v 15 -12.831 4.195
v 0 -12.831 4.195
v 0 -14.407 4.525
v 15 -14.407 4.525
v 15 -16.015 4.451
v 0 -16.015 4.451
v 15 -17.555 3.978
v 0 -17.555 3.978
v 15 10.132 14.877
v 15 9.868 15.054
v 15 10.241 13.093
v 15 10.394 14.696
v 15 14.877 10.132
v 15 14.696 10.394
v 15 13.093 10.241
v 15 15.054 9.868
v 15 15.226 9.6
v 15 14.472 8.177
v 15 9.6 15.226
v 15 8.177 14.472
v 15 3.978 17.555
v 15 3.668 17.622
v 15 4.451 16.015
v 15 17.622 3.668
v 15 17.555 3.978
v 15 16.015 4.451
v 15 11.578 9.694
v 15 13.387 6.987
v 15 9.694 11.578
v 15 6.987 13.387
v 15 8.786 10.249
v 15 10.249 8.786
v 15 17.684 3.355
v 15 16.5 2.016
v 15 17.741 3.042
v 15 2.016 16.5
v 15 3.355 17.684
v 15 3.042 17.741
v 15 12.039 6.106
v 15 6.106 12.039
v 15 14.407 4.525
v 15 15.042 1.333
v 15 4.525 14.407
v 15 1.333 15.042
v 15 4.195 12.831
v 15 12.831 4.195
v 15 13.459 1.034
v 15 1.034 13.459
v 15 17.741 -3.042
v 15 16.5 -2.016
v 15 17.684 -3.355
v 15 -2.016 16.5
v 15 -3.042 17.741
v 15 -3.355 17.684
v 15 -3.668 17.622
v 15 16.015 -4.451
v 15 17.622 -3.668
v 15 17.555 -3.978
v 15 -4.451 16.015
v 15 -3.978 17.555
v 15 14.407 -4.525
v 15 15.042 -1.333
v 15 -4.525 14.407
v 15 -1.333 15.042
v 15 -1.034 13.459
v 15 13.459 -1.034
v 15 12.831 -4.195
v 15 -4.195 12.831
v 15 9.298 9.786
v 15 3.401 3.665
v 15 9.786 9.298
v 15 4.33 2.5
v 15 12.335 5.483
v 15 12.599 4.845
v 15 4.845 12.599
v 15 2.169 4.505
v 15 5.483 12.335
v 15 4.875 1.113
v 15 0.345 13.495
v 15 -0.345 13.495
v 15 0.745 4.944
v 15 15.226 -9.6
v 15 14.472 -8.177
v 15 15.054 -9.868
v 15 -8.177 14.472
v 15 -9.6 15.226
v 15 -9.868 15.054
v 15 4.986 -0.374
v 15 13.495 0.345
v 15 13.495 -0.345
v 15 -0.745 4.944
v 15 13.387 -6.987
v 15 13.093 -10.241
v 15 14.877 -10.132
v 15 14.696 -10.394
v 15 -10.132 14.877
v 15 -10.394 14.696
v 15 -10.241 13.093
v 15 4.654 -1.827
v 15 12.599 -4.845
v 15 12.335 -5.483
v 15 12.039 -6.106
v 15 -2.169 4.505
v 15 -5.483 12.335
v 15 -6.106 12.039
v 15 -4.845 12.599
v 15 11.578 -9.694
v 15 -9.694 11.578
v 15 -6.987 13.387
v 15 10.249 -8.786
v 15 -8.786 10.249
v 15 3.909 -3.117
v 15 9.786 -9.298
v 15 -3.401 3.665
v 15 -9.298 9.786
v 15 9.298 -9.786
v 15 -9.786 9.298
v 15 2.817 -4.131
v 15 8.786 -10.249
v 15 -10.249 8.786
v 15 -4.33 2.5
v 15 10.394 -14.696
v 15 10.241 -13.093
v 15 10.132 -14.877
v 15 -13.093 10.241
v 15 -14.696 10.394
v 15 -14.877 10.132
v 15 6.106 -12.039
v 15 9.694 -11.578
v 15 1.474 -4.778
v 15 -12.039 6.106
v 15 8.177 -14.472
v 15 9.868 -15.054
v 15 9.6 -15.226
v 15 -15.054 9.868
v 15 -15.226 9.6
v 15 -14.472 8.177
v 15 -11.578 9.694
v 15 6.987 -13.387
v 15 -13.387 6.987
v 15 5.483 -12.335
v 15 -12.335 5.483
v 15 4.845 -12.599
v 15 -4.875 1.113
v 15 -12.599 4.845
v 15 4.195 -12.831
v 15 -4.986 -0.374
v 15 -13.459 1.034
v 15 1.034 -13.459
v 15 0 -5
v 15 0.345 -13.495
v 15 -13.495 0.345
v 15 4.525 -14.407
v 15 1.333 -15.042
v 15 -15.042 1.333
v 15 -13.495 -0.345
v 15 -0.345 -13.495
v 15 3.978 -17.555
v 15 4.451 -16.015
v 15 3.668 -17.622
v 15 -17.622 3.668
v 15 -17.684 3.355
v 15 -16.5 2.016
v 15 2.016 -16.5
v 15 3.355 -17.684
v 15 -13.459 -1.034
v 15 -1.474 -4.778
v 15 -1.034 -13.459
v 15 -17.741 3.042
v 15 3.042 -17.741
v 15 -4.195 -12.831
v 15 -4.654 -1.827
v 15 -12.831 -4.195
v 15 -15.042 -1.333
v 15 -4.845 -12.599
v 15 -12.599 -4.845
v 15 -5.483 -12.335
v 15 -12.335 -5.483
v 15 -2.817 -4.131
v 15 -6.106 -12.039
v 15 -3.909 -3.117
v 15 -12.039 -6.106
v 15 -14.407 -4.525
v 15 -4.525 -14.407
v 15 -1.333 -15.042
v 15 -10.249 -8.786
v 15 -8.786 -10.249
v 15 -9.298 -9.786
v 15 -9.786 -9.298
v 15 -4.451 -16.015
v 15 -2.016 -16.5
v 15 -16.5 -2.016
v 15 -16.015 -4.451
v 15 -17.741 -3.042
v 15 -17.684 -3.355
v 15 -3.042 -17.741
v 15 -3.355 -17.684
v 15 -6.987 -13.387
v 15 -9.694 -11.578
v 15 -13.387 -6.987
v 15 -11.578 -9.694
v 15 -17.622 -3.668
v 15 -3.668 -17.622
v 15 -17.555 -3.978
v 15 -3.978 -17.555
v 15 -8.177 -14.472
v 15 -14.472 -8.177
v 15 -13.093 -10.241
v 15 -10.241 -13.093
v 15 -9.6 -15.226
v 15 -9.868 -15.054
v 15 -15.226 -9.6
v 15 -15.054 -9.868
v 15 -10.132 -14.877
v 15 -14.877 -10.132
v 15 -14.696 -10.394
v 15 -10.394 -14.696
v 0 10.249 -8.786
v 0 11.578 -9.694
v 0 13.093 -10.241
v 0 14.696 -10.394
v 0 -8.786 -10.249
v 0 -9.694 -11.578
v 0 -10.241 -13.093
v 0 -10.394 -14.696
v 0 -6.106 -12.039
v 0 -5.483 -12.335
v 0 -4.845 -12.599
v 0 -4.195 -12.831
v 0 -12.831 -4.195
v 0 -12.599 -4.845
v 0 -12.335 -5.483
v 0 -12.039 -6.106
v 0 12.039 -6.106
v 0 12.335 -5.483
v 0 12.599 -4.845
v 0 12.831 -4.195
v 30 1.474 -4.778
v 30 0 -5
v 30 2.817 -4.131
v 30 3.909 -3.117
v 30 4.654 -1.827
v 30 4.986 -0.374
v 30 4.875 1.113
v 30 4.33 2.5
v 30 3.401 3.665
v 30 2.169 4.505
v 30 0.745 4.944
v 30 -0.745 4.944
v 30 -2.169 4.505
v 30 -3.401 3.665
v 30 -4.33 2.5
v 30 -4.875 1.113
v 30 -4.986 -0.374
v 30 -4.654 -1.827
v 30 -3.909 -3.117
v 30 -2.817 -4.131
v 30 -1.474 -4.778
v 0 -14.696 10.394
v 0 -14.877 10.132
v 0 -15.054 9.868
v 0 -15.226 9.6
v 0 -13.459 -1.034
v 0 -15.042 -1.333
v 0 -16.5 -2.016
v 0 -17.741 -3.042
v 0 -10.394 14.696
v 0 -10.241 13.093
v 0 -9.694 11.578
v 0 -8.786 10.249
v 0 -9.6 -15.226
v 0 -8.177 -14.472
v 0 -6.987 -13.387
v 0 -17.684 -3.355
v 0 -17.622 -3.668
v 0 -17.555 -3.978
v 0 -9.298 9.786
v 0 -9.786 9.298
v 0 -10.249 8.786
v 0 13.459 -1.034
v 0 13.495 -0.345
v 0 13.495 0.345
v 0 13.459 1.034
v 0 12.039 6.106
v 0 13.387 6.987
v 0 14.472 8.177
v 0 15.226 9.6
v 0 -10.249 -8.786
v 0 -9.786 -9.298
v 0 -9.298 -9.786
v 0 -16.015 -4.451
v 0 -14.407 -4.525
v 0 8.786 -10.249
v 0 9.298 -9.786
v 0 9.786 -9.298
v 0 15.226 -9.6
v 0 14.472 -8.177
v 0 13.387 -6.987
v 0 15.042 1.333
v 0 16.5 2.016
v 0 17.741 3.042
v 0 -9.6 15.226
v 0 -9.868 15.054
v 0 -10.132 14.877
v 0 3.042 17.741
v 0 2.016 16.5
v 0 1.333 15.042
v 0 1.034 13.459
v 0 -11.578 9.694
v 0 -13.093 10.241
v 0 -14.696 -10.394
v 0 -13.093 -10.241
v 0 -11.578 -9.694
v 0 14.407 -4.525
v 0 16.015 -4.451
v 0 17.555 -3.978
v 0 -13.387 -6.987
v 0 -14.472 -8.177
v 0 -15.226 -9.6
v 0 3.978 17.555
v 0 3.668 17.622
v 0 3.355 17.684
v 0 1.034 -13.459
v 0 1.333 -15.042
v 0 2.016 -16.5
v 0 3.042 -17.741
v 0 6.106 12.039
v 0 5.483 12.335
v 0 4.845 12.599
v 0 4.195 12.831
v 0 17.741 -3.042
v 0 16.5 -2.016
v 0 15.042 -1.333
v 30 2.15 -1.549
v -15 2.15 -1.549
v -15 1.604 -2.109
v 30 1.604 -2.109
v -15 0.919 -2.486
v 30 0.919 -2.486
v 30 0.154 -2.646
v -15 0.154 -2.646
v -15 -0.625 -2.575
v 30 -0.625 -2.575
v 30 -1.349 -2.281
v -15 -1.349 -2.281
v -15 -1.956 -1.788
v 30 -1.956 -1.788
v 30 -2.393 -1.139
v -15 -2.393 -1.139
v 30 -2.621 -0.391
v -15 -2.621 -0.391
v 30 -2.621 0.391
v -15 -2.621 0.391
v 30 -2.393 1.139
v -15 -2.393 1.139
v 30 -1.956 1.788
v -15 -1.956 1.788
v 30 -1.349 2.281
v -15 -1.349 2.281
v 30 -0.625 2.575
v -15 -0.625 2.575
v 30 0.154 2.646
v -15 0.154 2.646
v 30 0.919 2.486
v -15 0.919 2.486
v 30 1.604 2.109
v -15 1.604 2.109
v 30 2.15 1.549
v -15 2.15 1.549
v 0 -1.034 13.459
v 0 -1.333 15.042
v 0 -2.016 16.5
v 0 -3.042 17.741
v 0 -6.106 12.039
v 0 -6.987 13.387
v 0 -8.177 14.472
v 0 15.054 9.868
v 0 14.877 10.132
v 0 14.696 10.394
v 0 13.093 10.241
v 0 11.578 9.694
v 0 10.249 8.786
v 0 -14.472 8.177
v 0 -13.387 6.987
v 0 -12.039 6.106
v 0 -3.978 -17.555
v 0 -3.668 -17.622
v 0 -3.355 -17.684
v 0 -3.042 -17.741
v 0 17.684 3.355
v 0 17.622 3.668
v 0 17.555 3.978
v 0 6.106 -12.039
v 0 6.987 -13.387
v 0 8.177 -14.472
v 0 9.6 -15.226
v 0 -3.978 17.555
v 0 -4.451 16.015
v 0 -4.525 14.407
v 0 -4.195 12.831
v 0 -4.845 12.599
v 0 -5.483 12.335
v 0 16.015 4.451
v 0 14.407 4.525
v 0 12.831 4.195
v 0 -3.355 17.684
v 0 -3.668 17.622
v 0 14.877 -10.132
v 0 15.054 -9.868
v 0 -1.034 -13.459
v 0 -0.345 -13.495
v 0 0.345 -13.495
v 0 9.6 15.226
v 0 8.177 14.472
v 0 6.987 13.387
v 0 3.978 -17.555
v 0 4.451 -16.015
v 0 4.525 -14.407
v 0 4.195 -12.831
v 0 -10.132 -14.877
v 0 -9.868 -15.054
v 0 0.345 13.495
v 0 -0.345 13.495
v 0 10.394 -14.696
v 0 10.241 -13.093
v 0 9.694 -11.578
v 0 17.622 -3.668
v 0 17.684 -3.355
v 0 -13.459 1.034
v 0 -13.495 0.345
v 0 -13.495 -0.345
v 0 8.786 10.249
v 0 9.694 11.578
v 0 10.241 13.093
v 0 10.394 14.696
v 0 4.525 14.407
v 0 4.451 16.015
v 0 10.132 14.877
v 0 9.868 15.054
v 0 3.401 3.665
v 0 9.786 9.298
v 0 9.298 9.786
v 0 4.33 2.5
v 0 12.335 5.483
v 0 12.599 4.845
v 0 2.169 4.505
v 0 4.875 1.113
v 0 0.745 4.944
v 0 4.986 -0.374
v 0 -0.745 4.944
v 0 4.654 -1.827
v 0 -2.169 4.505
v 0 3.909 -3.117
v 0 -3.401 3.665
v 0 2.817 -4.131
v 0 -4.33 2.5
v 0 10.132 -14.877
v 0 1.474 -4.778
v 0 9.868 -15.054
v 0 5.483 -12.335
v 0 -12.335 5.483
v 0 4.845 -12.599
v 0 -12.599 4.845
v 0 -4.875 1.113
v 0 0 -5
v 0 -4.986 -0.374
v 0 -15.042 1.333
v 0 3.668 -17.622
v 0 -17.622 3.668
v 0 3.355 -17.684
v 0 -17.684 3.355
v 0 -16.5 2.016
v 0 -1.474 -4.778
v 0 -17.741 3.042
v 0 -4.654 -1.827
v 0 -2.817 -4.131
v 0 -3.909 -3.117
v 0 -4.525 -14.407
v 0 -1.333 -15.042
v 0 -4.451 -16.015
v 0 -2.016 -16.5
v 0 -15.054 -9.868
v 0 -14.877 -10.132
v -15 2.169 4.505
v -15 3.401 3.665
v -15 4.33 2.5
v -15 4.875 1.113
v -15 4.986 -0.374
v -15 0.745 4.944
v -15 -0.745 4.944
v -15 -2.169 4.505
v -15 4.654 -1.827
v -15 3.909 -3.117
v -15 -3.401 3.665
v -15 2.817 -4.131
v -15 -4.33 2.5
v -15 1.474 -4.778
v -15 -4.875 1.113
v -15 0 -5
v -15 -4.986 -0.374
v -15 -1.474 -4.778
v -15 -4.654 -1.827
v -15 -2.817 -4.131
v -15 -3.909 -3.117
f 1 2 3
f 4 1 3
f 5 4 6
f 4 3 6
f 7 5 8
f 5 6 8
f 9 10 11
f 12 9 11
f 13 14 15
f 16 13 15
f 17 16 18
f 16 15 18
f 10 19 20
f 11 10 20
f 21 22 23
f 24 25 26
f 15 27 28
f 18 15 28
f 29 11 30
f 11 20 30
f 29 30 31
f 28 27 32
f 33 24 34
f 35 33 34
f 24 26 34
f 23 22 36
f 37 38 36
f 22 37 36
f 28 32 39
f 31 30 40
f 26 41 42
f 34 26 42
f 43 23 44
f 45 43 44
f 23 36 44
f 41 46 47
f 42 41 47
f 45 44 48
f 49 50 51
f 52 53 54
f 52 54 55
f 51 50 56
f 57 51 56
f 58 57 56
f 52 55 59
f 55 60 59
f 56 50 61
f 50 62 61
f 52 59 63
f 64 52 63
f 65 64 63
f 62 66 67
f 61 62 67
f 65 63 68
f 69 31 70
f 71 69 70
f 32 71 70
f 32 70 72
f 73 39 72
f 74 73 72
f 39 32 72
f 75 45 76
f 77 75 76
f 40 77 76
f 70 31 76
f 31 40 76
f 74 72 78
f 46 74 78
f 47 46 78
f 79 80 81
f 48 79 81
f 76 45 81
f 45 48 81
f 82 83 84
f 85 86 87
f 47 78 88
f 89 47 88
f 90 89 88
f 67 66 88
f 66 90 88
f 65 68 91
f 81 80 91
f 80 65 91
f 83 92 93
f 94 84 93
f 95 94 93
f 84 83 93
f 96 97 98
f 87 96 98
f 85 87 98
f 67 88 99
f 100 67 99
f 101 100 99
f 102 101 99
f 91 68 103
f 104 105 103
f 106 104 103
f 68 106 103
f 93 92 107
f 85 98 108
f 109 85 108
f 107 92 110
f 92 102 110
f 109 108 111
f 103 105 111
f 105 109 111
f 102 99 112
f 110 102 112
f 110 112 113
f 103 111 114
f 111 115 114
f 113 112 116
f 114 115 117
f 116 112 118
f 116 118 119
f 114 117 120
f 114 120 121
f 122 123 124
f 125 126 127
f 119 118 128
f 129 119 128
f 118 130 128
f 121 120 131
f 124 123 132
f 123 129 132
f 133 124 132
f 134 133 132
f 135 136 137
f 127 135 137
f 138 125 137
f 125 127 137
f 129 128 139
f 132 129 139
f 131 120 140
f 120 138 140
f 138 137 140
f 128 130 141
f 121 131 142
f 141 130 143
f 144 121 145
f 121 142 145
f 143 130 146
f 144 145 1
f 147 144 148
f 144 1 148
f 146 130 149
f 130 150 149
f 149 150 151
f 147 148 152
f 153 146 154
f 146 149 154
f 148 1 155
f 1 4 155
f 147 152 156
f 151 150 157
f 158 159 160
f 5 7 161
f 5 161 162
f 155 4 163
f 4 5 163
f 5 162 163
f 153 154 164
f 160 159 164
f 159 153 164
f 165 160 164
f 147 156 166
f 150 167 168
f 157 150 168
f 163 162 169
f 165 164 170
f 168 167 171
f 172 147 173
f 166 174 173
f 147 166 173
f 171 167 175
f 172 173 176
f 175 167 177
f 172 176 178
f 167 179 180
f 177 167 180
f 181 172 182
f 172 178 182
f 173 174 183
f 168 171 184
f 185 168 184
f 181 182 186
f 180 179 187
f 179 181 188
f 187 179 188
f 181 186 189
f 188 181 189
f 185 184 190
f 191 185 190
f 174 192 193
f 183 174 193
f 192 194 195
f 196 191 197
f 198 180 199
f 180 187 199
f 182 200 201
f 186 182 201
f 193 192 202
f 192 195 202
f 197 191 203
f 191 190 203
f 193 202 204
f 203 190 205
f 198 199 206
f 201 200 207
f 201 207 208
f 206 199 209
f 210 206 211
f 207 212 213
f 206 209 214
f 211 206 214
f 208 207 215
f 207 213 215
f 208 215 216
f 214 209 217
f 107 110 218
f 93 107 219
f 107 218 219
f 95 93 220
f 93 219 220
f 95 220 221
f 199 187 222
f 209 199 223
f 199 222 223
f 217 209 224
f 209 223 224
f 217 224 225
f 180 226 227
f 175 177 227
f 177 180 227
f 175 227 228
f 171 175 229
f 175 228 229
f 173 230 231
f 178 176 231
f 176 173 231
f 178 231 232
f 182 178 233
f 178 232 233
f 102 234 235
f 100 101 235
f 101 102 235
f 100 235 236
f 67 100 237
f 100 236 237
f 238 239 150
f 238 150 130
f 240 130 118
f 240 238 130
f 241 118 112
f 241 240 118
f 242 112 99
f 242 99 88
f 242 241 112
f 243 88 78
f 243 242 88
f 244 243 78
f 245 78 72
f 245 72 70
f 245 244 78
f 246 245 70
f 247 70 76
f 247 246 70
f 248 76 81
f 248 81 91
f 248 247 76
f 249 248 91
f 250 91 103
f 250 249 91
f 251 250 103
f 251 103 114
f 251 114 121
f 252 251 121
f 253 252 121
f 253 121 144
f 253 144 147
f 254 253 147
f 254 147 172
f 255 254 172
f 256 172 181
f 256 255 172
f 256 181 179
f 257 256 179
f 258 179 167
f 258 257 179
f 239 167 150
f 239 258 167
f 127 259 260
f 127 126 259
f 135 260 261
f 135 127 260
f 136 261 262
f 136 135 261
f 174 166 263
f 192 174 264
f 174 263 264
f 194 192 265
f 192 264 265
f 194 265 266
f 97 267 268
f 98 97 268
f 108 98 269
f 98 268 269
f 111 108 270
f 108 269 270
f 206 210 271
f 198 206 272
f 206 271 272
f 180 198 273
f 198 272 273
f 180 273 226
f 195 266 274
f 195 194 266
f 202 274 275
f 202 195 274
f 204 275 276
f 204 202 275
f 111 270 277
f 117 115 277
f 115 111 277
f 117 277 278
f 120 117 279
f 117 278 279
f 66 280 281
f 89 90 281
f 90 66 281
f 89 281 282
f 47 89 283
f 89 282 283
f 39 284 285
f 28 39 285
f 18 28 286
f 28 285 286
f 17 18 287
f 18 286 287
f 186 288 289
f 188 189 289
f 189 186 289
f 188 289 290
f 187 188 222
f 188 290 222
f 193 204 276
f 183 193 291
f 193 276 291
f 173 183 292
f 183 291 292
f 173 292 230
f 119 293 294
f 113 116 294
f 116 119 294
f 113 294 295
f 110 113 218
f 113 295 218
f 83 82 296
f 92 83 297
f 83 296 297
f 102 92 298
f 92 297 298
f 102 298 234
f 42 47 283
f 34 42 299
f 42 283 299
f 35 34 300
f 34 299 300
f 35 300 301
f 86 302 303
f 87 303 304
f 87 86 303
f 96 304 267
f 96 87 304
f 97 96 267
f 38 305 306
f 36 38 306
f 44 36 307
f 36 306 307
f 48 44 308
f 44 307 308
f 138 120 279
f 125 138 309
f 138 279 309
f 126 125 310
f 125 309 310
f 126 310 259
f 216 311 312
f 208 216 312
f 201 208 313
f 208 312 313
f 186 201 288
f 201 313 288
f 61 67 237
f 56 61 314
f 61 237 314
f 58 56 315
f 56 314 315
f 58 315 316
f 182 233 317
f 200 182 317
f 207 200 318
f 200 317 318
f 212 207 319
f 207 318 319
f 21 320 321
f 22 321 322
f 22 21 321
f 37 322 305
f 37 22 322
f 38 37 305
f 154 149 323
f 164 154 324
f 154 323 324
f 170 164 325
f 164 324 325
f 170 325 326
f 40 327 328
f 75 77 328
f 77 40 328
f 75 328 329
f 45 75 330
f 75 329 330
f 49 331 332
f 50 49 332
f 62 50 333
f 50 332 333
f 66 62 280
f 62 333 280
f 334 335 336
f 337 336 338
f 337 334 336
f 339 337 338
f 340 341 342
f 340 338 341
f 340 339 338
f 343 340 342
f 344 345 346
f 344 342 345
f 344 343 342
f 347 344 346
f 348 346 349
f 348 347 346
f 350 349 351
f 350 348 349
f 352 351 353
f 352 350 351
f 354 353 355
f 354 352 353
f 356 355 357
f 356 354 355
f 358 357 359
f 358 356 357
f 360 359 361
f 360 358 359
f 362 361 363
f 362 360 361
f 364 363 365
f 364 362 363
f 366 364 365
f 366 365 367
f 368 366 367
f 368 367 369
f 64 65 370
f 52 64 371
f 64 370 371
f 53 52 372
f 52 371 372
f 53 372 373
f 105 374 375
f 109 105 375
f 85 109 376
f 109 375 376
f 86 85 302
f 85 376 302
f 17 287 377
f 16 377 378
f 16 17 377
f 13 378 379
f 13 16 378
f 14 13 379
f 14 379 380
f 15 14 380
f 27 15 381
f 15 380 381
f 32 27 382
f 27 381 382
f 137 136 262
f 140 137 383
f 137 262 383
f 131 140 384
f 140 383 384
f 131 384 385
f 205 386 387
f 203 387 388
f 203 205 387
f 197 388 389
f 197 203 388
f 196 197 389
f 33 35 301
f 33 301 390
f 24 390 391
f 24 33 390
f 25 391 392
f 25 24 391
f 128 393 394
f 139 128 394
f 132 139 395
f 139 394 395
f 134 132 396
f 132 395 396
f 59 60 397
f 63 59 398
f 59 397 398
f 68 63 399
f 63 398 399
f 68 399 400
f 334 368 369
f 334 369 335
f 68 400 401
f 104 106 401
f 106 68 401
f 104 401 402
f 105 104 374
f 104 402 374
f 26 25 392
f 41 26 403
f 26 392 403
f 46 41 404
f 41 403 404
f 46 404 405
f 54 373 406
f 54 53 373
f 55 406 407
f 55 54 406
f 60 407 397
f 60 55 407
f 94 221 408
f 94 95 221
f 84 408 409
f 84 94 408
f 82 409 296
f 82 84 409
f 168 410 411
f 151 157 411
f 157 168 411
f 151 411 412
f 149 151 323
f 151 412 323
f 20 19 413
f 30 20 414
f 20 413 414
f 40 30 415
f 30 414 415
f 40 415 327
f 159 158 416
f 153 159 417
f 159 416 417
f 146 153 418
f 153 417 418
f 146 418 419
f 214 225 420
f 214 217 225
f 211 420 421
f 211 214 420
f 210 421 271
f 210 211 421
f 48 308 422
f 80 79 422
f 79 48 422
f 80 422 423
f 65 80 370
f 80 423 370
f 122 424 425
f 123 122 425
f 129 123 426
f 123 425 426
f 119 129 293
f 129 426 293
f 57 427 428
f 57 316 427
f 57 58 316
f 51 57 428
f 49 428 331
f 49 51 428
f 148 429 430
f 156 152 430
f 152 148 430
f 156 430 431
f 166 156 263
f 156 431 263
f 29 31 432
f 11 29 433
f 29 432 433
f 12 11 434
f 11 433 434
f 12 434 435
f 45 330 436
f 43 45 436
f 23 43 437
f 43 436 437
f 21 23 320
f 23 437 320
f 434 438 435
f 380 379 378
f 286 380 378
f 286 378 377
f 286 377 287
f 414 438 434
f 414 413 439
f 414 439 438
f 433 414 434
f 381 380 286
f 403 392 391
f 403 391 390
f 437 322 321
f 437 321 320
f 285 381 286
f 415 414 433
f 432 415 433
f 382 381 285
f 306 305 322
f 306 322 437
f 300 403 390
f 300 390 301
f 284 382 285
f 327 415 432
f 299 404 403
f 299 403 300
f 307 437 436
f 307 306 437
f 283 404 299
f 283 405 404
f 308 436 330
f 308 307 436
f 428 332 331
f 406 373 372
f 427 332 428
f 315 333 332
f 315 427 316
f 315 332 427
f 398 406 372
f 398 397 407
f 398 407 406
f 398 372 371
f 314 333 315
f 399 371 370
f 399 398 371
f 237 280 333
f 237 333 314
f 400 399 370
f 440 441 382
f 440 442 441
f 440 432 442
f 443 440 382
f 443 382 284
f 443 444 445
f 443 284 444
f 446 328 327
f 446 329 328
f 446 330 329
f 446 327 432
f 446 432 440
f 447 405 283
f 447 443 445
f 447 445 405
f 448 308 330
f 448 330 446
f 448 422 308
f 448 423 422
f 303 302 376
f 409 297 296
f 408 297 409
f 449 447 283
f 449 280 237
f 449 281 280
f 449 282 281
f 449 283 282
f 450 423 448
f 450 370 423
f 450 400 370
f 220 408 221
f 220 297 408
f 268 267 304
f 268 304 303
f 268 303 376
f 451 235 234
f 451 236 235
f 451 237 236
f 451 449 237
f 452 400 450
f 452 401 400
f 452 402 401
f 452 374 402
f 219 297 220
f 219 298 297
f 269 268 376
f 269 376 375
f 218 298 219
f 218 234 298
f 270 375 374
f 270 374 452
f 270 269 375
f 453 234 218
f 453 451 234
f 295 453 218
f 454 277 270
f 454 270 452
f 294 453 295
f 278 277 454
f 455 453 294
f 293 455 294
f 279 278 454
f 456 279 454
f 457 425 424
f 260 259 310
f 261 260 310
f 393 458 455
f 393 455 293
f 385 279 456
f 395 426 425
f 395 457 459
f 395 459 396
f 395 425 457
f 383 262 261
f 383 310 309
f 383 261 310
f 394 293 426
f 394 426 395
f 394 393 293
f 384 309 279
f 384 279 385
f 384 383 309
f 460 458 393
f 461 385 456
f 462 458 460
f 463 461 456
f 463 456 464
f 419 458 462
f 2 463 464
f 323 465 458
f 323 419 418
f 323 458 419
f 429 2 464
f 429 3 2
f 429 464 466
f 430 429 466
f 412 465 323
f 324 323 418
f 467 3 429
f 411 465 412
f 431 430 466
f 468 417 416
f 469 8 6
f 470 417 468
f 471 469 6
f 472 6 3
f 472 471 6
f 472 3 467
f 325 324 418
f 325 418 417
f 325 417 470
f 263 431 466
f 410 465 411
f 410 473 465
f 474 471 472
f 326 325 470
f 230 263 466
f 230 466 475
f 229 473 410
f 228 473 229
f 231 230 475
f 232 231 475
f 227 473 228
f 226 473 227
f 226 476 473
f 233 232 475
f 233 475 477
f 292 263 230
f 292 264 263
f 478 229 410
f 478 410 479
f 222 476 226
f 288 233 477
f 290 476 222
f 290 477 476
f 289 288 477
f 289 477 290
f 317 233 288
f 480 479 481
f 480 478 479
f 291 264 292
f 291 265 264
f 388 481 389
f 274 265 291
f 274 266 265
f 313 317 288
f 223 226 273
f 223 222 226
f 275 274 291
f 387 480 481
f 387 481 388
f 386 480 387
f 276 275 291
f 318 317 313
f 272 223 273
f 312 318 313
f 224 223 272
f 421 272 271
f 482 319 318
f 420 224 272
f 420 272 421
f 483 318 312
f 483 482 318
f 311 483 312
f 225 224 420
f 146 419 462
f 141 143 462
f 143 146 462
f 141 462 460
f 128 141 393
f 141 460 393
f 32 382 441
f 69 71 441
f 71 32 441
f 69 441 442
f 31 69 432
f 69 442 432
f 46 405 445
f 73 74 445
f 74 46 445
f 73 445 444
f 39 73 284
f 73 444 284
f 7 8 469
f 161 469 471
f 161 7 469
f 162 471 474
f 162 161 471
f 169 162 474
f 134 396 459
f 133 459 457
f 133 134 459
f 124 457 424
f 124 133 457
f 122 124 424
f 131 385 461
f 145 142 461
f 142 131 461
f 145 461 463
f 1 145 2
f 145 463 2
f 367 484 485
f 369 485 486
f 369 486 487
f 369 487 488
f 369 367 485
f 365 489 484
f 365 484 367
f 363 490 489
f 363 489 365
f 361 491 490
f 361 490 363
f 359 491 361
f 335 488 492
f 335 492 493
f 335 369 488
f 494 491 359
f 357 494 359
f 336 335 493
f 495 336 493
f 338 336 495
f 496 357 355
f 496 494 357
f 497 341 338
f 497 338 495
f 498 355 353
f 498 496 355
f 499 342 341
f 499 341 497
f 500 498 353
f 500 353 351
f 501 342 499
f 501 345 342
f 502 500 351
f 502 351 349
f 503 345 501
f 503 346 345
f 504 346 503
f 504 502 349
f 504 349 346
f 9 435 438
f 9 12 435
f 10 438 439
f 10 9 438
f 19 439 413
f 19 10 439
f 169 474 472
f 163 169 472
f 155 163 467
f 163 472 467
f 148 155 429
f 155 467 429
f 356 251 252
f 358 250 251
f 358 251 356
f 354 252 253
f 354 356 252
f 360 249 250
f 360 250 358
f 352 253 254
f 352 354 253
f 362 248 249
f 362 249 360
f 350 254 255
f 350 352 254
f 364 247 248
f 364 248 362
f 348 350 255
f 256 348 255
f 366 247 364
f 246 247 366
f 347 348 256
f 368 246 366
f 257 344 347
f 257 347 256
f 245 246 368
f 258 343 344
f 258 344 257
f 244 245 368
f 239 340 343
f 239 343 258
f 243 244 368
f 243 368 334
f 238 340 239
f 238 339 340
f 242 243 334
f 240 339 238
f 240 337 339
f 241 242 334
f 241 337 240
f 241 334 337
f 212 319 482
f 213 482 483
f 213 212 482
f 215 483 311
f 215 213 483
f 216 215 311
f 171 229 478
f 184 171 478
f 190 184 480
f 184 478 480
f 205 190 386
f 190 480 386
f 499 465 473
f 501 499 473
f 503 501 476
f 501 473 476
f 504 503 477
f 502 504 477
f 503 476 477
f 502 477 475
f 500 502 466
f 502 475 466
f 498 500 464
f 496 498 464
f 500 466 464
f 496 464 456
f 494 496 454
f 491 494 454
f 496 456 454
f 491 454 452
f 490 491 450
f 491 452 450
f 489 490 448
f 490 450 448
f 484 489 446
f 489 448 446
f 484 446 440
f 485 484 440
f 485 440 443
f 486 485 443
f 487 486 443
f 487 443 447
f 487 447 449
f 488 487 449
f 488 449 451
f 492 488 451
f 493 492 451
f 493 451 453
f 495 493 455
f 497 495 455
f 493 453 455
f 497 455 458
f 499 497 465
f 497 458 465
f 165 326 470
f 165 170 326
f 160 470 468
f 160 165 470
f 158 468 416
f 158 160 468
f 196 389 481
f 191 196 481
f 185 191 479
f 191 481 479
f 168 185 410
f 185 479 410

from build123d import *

# Parameters (mm, degrees)
BASPROSKE_W         = 15
BASPROSKE_H         = 18
TOOTHCUT_DEPTH      = 30.546573405
TEETHCUTS_COUNT     = 16
TEETHCUTS_ANGLE     = 337.5
HUBNEABOTSKE_R      = 5
HUBNEARBOTH_DEPTH   = 15.0000254
HUBFAR_START        = 15.0000254
HUBFARSKE_R         = 5
HUBFAR_DEPTH        = 15.0000254
BORSKE_R            = 2.5
BORE_DEPTH          = 45.0000508
BOSS_EXTRUDE1_DEPTH = 45.0000508
CUT_EXTRUDE1_DEPTH  = 52.521769281


with BuildPart() as part:
    # BasProSke → Base-Revolve (revolve)
    with BuildSketch(Plane(origin=(0, 0, 0), x_dir=(1, 0, 0), z_dir=(0, 1, 0)), mode=Mode.PRIVATE) as base_revolve_sk:
        with Locations((7.5, 9)):
            Rectangle(BASPROSKE_W, BASPROSKE_H)
    revolve(base_revolve_sk.sketch.rotate(Axis((-10, 0, 0), (1, 0, 0)), 180), axis=Axis((-10, 0, 0), (1, 0, 0)))

    # TooCutSke → ToothCut (cut, through all)
    with BuildSketch(Plane(origin=(0, 0, 0), x_dir=(0, 0, -1), z_dir=(1, 0, 0))):
        with BuildLine():
            ThreePointArc((1.03434411, 13.459313997), (0, 13.499), (-1.03434411, 13.459313997))
            ThreePointArc((-1.03434411, 13.459313997), (-1.635143665, 15.806872195), (-3.065655864, 17.762792553))
            ThreePointArc((-3.065655864, 17.762792553), (0, 18.0254), (3.065655864, 17.762792553))
            ThreePointArc((3.065655864, 17.762792553), (1.635143665, 15.806872195), (1.03434411, 13.459313997))
        make_face()
    toothcut = extrude(amount=TOOTHCUT_DEPTH, mode=Mode.SUBTRACT)

    # TeethCuts: ToothCut ×16 about axis
    teethcuts_axis = Axis((-10, 0, 0), (1, 0, 0))
    for i in range(1, TEETHCUTS_COUNT):
        add(toothcut.rotate(teethcuts_axis, i * TEETHCUTS_ANGLE / (TEETHCUTS_COUNT - 1)), mode=Mode.SUBTRACT)

    # HubNeaBotSke → HubNearBoth (add)
    with BuildSketch(Plane.ZY):
        with Locations(Location((0, 0, 0), (0, 0, 180))):
            Circle(HUBNEABOTSKE_R)
    extrude(amount=HUBNEARBOTH_DEPTH)

    # HubFarSke → HubFar (add)
    with BuildSketch(Plane(origin=(15, 0, 0), x_dir=(0, 0, -1), z_dir=(1, 0, 0)).offset(HUBFAR_START)):
        Circle(HUBFARSKE_R)
    extrude(amount=-HUBFAR_DEPTH)

    # BorSke → Bore (cut, symmetric)
    with BuildSketch(Plane(origin=(0, 0, 0), x_dir=(0, 0, -1), z_dir=(1, 0, 0))):
        with Locations(Location((0, 0, 0), (0, 0, 180))):
            Circle(BORSKE_R)
    extrude(amount=BORE_DEPTH, both=True, mode=Mode.SUBTRACT)

    # Sketch1 → Boss-Extrude1 (add)
    with BuildSketch(Plane(origin=(30.0000254, 0, 0), x_dir=(0, 0, -1), z_dir=(1, 0, 0))):
        with BuildLine():
            Line((-1.5, 2), (1.5, 2))
            ThreePointArc((1.5, 2), (0, 2.5), (-1.5, 2))
        make_face()
    extrude(amount=-BOSS_EXTRUDE1_DEPTH)

    # Sketch2 → Cut-Extrude1 (cut, through all)
    with BuildSketch(Plane(origin=(30.0000254, 0, 0), x_dir=(0, 0, -1), z_dir=(1, 0, 0))):
        with BuildLine():
            Line((-1.549193338, 2.15), (1.549193338, 2.15))
            ThreePointArc((1.549193338, 2.15), (0, -2.65), (-1.549193338, 2.15))
        make_face()
        with BuildLine():
            Line((-1.5, 2), (1.5, 2))
            ThreePointArc((1.5, 2), (0, -2.5), (-1.5, 2))
        make_face(mode=Mode.SUBTRACT)
    extrude(amount=-CUT_EXTRUDE1_DEPTH, mode=Mode.SUBTRACT)


solid = part.part
